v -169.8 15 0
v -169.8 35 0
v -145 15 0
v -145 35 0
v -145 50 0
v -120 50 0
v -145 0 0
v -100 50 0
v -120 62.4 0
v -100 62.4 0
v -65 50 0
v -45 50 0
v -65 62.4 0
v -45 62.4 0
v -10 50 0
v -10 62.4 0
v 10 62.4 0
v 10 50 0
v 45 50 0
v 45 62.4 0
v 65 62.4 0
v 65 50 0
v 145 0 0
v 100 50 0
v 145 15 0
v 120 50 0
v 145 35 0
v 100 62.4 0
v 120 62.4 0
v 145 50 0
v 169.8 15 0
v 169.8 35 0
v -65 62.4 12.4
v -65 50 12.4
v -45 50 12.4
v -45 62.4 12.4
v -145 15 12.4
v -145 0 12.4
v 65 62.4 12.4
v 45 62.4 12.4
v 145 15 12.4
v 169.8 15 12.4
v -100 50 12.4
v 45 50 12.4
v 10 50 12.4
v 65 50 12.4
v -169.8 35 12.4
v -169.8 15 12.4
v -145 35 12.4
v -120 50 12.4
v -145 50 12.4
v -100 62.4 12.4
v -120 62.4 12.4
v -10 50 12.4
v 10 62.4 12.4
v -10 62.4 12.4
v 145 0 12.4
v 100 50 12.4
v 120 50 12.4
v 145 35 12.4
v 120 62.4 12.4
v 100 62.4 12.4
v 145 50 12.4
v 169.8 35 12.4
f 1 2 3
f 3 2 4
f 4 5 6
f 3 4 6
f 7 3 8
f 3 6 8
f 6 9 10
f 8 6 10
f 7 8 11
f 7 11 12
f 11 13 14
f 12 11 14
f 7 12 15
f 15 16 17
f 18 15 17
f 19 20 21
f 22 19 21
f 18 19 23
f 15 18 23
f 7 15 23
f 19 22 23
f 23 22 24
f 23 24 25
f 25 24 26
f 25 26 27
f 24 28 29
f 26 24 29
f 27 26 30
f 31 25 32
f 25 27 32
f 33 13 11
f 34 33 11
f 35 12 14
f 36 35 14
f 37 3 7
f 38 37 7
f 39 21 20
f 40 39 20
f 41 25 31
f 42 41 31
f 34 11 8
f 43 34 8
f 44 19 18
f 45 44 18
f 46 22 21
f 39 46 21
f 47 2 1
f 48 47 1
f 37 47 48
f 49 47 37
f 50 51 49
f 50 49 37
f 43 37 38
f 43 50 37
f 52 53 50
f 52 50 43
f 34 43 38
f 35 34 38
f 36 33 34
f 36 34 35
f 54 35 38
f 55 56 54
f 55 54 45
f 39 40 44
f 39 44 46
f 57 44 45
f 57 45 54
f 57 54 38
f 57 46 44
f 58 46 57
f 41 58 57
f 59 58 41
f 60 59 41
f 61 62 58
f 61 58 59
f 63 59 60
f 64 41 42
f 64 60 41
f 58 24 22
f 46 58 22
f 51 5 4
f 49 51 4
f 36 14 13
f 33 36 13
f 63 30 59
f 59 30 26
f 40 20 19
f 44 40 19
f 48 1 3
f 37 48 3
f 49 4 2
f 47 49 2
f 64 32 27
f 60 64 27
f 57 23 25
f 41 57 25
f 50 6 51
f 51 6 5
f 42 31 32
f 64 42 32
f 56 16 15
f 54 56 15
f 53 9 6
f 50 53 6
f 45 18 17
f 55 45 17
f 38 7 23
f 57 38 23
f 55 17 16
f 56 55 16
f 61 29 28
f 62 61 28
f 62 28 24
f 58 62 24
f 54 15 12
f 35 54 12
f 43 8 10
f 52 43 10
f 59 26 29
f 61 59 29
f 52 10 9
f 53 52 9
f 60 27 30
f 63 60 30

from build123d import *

# Parameters (mm, degrees)
BOSS_EXTRUDE1_DEPTH = 12.4


with BuildPart() as part:
    # Model → Boss-Extrude1 (new body)
    with BuildSketch(Plane.XY):
        Polygon((145, 35), (145, 50), (120, 50), (120, 62.4), (100, 62.4), (100, 50), (65, 50), (65, 62.4), (45, 62.4), (45, 50), (10, 50), (10, 62.4), (-10, 62.4), (-10, 50), (-45, 50), (-45, 62.4), (-65, 62.4), (-65, 50), (-100, 50), (-100, 62.4), (-120, 62.4), (-120, 50), (-145, 50), (-145, 35), (-169.8, 35), (-169.8, 15), (-145, 15), (-145, 0), (145, 0), (145, 15), (169.8, 15), (169.8, 35), align=None)
    extrude(amount=BOSS_EXTRUDE1_DEPTH)


solid = part.part
